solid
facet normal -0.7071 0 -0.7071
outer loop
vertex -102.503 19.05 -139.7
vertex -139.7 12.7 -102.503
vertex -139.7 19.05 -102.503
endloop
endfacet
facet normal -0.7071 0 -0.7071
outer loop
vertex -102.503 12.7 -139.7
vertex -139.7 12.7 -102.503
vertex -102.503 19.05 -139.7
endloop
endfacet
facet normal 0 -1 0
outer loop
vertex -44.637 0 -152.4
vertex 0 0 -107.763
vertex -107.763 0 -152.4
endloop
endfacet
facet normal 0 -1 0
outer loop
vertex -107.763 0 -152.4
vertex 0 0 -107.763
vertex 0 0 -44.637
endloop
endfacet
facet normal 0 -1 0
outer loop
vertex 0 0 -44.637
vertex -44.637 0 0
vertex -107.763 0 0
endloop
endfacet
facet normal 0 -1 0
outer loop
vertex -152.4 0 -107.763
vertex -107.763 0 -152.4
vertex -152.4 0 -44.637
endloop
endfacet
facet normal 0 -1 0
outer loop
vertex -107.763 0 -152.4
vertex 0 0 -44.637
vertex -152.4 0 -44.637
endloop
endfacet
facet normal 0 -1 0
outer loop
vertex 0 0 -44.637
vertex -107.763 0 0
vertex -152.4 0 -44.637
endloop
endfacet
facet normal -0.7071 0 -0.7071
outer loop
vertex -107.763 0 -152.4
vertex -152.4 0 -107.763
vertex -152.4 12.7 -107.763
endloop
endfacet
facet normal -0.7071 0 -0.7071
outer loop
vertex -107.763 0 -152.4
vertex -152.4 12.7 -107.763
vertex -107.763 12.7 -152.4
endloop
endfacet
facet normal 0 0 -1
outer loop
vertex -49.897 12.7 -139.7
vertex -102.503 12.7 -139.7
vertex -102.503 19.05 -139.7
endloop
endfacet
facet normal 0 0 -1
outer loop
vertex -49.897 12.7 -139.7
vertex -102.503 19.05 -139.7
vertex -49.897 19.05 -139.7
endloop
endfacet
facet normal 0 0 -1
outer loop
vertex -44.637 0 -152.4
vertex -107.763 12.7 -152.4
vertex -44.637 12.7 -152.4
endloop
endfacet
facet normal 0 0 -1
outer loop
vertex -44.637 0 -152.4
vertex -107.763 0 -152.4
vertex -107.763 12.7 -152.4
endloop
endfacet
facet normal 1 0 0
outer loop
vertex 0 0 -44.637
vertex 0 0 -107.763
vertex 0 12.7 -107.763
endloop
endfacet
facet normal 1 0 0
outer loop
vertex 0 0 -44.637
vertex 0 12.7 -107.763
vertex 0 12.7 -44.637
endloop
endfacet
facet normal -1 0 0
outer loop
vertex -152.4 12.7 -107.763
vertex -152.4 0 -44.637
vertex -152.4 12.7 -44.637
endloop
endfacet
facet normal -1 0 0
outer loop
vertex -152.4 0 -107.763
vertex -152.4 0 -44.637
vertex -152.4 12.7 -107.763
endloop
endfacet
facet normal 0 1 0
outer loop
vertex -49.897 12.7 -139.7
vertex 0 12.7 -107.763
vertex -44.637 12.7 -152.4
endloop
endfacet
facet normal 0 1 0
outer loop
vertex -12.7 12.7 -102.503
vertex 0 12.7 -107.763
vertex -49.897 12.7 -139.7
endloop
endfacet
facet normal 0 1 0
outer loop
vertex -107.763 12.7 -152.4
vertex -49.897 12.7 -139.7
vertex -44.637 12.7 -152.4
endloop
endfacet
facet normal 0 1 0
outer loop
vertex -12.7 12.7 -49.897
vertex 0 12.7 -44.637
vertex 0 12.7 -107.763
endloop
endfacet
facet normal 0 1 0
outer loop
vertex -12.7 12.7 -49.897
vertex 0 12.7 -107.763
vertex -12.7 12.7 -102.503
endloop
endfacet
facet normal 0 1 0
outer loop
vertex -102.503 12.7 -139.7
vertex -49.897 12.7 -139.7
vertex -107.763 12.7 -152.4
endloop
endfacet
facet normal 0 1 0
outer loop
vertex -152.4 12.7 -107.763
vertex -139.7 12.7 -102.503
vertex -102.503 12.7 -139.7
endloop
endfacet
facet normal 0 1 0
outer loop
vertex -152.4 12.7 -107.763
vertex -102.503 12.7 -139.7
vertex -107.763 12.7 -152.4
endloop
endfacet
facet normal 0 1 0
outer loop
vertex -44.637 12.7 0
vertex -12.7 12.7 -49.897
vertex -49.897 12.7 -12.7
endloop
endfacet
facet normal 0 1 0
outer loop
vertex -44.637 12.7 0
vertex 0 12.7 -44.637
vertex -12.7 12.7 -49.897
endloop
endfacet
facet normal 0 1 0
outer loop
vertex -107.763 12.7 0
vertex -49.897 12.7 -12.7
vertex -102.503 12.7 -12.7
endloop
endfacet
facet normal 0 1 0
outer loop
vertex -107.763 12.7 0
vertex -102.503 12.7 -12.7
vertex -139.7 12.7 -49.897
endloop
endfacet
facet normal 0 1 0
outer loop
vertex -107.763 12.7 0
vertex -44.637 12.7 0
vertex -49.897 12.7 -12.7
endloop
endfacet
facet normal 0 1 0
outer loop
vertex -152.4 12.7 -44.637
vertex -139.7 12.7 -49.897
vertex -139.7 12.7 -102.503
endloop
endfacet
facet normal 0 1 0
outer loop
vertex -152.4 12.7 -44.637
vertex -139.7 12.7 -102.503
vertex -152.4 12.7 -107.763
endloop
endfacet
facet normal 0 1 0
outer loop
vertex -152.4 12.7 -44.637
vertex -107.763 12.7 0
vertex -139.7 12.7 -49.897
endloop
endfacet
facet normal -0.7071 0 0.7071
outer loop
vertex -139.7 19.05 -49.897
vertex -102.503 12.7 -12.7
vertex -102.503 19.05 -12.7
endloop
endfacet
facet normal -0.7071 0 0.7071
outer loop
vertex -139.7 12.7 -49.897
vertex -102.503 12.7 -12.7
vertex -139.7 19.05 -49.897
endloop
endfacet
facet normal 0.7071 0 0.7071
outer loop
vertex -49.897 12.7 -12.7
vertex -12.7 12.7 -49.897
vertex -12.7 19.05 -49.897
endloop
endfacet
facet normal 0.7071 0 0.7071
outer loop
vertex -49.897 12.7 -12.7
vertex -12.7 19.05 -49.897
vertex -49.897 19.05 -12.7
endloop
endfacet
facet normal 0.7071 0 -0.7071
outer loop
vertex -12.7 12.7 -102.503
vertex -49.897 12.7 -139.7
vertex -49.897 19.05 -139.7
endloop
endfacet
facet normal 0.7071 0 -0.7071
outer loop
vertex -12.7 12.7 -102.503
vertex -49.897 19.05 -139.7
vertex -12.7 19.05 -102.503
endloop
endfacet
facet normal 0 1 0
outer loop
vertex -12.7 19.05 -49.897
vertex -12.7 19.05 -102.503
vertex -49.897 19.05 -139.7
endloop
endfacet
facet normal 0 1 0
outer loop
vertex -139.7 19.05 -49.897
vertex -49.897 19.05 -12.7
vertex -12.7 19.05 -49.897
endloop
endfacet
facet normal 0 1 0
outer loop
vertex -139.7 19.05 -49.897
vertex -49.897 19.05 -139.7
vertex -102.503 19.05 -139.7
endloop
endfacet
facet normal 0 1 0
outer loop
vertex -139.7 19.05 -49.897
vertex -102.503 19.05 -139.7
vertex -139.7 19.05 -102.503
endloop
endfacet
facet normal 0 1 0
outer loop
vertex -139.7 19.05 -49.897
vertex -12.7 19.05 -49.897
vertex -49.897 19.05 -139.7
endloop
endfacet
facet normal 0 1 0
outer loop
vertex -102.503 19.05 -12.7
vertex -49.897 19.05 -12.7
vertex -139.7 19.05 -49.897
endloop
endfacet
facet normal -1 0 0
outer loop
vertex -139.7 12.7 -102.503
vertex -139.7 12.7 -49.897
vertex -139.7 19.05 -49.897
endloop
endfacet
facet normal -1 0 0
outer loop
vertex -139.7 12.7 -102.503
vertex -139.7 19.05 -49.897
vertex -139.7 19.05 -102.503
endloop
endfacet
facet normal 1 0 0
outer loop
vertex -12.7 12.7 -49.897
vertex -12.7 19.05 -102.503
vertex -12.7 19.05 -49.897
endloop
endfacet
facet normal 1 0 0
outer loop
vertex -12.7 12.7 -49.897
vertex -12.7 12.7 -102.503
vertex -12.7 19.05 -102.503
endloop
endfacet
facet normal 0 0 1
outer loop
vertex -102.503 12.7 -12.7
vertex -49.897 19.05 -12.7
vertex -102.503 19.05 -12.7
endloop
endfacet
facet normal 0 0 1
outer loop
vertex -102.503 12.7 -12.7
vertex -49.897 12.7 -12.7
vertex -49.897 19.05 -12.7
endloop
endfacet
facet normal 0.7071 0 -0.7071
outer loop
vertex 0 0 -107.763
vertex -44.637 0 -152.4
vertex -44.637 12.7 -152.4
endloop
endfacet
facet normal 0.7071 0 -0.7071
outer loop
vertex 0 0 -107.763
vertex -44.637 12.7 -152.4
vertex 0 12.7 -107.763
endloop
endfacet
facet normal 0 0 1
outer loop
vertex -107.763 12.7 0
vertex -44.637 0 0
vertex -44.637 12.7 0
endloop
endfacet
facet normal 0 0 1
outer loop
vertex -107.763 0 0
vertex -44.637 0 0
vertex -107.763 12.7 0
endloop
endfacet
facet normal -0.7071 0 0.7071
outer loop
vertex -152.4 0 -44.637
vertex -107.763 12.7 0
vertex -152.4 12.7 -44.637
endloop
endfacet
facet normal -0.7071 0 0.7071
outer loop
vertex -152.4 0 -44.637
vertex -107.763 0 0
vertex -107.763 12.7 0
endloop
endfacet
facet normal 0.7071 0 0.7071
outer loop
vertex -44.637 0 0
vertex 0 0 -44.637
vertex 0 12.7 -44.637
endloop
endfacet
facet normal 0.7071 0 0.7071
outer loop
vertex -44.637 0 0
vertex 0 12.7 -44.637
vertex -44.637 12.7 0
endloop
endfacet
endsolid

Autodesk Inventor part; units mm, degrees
ref_plane "YZ Plane" through (0, 0, 0) normal (1, 0, 0) x (0, 1, 0)
ref_plane "XZ Plane" through (0, 0, 0) normal (0, 1, 0) x (-1, 0, 0)
ref_plane "XY Plane" through (0, 0, 0) normal (0, 0, 1) x (1, 0, 0)
sketch "Sketch1" plane through (0, 0, 0) normal (0, 1, 0) x (-1, 0, 0)
  line L0 (0, 0) -> (152.4, 0) construction
  line L1 (152.4, 0) -> (152.4, -152.4) construction
  line L2 (152.4, -152.4) -> (0, -152.4) construction
  line L3 (0, -152.4) -> (0, 0) construction
  line L4 (44.6369, -152.4) -> (0, -107.7631)
  line L5 (0, -107.7631) -> (0, -44.6369)
  line L6 (0, -44.6369) -> (44.6369, 0)
  line L7 (44.6369, 0) -> (107.7631, 0)
  line L8 (107.7631, 0) -> (152.4, -44.6369)
  line L9 (152.4, -44.6369) -> (152.4, -107.7631)
  line L10 (152.4, -107.7631) -> (107.7631, -152.4)
  line L11 (107.7631, -152.4) -> (44.6369, -152.4)
  line L12 (102.5026, -12.7) -> (139.7, -49.8974)
  line L13 (139.7, -49.8974) -> (139.7, -102.5026)
  line L14 (139.7, -102.5026) -> (102.5026, -139.7)
  line L15 (102.5026, -139.7) -> (49.8974, -139.7)
  line L16 (49.8974, -139.7) -> (12.7, -102.5026)
  line L17 (12.7, -102.5026) -> (12.7, -49.8974)
  line L18 (12.7, -49.8974) -> (49.8974, -12.7)
  line L19 (49.8974, -12.7) -> (102.5026, -12.7)
  point P0 (76.2, -76.2)
  point P1 (76.2, -76.2)
  point P2 (76.2, -76.2)
  dimension "d0" = 152.4
  dimension "d1" = 152.4
  dimension "d2" = 12.7
  dimension "d3" = 63.1262
  dimension "d4" = 52.6051
sketch "Sketch2" plane through (0, 0, 0) normal (0, 1, 0) x (-1, 0, 0)
  line L0 (0, 0) -> (152.4, 0) construction
  line L1 (152.4, 0) -> (152.4, -152.4) construction
  line L2 (152.4, -152.4) -> (0, -152.4) construction
  line L3 (0, -152.4) -> (0, 0) construction
  line L4 (44.6369, -152.4) -> (0, -107.7631)
  line L5 (0, -107.7631) -> (0, -44.6369)
  line L6 (0, -44.6369) -> (44.6369, 0)
  line L7 (44.6369, 0) -> (107.7631, 0)
  line L8 (107.7631, 0) -> (152.4, -44.6369)
  line L9 (152.4, -44.6369) -> (152.4, -107.7631)
  line L10 (152.4, -107.7631) -> (107.7631, -152.4)
  line L11 (107.7631, -152.4) -> (44.6369, -152.4)
  line L12 (102.5026, -12.7) -> (139.7, -49.8974)
  line L13 (139.7, -49.8974) -> (139.7, -102.5026)
  line L14 (139.7, -102.5026) -> (102.5026, -139.7)
  line L15 (102.5026, -139.7) -> (49.8974, -139.7)
  line L16 (49.8974, -139.7) -> (12.7, -102.5026)
  line L17 (12.7, -102.5026) -> (12.7, -49.8974)
  line L18 (12.7, -49.8974) -> (49.8974, -12.7)
  line L19 (49.8974, -12.7) -> (102.5026, -12.7)
  point P0 (76.2, -76.2)
  point P1 (76.2, -76.2)
  point P2 (76.2, -76.2)
  dimension "d5" = 152.4
  dimension "d6" = 152.4
  dimension "d7" = 12.7
  dimension "d8" = 63.1262
  dimension "d9" = 52.6051
extrude "Extrusion1" add sketch "Sketch1" along normal blind 12.7 contours L4 L5 L6 L7 L8 L9 L10 L11 | L12 L13 L14 L15 L16 L17 L18 L19
extrude "Extrusion2" add sketch "Sketch2" along normal blind 19.05 contours L12 L13 L14 L15 L16 L17 L18 L19
properties part number "SatelliteTopFace"
